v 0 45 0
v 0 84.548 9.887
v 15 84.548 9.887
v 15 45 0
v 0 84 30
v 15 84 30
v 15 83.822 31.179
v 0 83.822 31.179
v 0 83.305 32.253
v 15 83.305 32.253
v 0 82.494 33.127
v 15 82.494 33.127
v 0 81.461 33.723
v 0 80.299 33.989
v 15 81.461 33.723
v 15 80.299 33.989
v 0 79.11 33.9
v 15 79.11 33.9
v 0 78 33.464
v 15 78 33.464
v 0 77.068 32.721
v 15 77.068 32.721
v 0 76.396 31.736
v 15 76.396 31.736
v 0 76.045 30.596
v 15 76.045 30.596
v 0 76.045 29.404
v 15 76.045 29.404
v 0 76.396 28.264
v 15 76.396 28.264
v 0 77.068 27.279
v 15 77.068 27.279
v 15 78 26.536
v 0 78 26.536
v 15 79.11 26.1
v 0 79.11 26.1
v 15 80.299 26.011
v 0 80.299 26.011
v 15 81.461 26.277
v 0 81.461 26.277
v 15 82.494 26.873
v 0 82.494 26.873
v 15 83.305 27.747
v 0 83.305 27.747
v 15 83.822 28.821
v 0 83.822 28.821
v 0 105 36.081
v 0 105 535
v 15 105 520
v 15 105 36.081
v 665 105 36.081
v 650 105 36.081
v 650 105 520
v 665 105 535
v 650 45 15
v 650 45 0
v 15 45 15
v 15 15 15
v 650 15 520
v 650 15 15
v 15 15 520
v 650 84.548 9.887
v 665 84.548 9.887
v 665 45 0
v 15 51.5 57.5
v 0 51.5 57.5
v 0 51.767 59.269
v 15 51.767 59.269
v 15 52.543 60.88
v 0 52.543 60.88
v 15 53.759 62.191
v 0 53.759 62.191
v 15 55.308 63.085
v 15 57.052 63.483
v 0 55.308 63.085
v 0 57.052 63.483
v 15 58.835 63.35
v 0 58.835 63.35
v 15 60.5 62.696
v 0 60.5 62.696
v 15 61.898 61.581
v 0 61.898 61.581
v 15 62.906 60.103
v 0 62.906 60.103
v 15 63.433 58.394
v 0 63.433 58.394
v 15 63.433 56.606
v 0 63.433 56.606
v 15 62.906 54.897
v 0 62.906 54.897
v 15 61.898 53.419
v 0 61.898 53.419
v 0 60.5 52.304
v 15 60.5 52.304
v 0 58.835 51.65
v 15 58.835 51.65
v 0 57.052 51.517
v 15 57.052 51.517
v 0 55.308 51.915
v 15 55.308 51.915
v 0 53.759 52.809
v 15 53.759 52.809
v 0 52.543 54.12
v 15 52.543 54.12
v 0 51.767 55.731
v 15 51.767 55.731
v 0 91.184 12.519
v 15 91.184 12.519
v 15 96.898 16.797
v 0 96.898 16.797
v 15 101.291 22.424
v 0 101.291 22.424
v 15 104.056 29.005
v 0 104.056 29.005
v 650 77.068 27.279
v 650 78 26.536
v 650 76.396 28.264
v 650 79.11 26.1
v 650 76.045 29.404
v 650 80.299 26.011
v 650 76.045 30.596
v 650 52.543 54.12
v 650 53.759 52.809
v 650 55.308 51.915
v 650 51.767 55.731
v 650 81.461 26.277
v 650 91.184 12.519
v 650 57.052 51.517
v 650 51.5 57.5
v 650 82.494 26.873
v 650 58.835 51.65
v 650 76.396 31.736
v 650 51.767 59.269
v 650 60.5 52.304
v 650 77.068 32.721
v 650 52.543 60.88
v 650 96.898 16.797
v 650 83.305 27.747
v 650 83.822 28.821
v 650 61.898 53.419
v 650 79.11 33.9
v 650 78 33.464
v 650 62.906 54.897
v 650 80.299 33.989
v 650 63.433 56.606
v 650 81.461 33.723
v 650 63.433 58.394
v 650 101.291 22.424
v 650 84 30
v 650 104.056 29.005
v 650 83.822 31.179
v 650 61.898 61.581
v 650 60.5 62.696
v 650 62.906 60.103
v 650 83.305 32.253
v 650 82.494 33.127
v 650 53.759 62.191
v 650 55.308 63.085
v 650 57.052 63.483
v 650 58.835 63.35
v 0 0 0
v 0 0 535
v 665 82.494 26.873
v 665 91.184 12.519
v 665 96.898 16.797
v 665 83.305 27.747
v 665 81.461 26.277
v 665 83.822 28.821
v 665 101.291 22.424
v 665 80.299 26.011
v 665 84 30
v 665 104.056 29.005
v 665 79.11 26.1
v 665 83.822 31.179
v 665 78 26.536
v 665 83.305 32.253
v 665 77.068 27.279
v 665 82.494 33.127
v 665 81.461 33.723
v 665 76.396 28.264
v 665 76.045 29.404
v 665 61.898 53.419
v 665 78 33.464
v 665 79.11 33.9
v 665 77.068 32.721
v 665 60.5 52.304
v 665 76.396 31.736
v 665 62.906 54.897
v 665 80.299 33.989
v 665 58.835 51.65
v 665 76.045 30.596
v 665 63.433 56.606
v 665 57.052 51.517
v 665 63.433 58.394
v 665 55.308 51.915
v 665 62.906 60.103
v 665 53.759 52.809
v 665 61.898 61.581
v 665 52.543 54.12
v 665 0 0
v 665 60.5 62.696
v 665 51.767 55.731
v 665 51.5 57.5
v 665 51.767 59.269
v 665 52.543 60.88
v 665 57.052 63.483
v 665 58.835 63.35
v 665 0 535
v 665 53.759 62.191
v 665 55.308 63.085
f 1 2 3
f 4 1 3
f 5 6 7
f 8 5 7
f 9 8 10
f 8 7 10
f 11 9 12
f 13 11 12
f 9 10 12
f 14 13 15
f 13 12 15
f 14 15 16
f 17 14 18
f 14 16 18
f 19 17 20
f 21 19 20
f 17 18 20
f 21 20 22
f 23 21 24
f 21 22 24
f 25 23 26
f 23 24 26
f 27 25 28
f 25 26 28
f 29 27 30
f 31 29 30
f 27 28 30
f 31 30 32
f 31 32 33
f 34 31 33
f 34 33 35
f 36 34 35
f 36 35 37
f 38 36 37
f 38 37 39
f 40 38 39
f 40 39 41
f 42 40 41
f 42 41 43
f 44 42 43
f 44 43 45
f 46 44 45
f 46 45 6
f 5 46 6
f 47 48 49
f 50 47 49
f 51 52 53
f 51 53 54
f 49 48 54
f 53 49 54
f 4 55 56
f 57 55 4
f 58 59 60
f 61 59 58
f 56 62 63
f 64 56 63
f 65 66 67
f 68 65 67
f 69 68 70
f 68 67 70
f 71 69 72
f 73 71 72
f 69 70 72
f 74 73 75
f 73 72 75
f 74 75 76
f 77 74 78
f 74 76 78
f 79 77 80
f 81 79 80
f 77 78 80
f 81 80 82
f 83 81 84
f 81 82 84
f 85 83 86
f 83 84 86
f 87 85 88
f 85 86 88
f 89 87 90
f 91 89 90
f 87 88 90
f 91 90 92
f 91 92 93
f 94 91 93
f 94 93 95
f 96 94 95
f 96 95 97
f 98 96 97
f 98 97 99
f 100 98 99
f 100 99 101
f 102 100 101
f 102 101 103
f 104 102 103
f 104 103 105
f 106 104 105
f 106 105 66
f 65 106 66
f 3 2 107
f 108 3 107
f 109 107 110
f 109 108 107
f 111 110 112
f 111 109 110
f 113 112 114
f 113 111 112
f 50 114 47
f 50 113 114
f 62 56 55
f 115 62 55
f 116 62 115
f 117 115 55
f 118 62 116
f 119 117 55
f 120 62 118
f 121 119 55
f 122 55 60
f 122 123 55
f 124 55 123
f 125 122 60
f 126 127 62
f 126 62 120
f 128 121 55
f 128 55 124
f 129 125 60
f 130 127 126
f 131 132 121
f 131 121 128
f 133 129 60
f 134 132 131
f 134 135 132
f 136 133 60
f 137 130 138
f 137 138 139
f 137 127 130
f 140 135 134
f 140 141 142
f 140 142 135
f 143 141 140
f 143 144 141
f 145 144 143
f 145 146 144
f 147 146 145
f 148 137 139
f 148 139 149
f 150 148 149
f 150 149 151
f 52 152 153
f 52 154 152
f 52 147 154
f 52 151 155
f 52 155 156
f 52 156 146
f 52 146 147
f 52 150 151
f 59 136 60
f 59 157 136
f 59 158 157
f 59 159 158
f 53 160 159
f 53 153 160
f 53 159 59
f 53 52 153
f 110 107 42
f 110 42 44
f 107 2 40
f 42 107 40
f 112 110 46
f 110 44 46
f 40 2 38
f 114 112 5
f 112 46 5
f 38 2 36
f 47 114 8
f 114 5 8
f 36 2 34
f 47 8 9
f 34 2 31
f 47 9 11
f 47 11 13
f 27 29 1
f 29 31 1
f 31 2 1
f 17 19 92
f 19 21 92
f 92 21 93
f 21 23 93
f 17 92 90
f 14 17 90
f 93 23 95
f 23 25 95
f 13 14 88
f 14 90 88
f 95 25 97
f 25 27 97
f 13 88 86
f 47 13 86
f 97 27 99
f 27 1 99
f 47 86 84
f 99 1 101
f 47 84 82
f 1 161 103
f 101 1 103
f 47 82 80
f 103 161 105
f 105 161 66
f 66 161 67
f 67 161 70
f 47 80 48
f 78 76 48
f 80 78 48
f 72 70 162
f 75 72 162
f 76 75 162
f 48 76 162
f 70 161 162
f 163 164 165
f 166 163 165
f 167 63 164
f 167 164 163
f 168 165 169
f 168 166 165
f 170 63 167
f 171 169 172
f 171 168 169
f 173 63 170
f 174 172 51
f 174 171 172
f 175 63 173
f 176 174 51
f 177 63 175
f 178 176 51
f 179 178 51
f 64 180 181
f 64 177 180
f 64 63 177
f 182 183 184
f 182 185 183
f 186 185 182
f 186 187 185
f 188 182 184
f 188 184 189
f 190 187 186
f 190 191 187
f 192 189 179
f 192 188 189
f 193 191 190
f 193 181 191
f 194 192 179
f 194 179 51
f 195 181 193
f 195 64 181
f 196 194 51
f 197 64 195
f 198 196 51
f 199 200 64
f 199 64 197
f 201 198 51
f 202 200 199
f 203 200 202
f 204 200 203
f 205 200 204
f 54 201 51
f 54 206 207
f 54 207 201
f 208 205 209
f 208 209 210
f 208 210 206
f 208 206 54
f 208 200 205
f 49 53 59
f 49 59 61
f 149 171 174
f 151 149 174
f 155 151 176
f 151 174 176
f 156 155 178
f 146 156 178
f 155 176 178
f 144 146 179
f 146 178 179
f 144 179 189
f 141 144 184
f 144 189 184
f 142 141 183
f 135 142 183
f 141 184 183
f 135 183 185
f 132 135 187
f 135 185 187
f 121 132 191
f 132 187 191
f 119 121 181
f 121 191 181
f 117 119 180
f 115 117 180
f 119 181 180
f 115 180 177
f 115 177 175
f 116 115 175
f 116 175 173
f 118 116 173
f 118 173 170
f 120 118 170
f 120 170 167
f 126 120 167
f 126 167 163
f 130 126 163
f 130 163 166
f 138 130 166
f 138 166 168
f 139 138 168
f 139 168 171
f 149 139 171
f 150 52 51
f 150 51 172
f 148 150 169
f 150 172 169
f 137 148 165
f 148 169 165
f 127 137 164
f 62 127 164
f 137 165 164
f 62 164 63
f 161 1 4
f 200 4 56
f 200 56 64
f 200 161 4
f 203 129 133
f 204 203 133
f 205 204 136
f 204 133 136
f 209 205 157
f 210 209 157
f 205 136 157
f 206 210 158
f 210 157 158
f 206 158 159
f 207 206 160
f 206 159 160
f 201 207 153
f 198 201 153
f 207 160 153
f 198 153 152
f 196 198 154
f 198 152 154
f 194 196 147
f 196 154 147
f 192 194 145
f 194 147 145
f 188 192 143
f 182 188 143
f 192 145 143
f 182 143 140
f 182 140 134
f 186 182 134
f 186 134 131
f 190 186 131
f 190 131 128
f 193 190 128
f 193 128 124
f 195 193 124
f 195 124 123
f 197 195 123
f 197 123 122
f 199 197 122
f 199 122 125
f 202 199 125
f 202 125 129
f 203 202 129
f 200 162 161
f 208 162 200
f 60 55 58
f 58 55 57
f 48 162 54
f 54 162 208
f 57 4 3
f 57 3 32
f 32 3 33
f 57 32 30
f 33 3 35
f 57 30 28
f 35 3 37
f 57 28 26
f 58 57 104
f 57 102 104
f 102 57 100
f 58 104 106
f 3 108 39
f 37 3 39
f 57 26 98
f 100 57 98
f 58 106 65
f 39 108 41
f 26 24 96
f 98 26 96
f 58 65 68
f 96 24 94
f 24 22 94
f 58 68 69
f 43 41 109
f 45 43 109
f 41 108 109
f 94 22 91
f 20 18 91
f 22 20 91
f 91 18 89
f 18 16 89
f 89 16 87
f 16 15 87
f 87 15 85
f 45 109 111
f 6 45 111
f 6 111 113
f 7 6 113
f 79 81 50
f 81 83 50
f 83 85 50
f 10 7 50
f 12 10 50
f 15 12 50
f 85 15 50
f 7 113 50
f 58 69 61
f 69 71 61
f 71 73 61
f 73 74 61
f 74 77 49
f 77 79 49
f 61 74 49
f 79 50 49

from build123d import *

# Parameters (mm, degrees)
F0_W     = 665
F0_H     = 535
F1_DEPTH = 105
F2_W     = 635
F2_H     = 505
F3_DEPTH = 90
F5_D     = 12
F6_W     = 635
F6_H     = 15
F7_DEPTH = 60
F8_SIZE2 = 15
F8_SIZE  = 60
F9_R     = 27
F11_D    = 8


with BuildPart() as f1:
    # F0 (on Front) → F1 (new body)
    with BuildSketch(Plane.XZ):
        with Locations((332.5, 267.5)):
            Rectangle(F0_W, F0_H)
    extrude(amount=-F1_DEPTH)

    # F2 (on face) → F3 (cut, through all)
    with BuildSketch(Plane(origin=(0, 105, 0), x_dir=(-1, 0, 0), z_dir=(0, 1, 0))):
        with Locations((-332.5, 267.5)):
            Rectangle(F2_W, F2_H)
    extrude(amount=-F3_DEPTH, mode=Mode.SUBTRACT)

    # F5 (through all)
    with Locations(Plane.YZ.offset(665)):
        with Locations((57.5, 57.5)):
            Hole(F5_D / 2)

    # F6 (on face) → F7 (cut)
    with BuildSketch(Plane(origin=(0, 105, 0), x_dir=(-1, 0, 0), z_dir=(0, 1, 0))):
        with Locations((-332.5, 7.5)):
            Rectangle(F6_W, F6_H)
    extrude(amount=-F7_DEPTH, mode=Mode.SUBTRACT)

    # F8
    f8_edges = [f1.edges().sort_by_distance(p)[0] for p in [
        (657.5, 105, 0),
        (7.5, 105, 0),
    ]]
    f8_side = f1.faces().sort_by_distance((332.5, 25.478723, 0))[0]
    chamfer(f8_edges, length=F8_SIZE, length2=F8_SIZE2, reference=f8_side)

    # F9
    f9_edges = [f1.edges().sort_by_distance(p)[0] for p in [
        (657.5, 105, 15),
        (7.5, 105, 15),
    ]]
    fillet(f9_edges, radius=F9_R)

    # F11 (through all)
    with Locations(Plane(origin=(0, 0, 0), x_dir=(0, -1, 0), z_dir=(-1, 0, 0))):
        with Locations((-80, 30)):
            Hole(F11_D / 2)


solid = f1.part
